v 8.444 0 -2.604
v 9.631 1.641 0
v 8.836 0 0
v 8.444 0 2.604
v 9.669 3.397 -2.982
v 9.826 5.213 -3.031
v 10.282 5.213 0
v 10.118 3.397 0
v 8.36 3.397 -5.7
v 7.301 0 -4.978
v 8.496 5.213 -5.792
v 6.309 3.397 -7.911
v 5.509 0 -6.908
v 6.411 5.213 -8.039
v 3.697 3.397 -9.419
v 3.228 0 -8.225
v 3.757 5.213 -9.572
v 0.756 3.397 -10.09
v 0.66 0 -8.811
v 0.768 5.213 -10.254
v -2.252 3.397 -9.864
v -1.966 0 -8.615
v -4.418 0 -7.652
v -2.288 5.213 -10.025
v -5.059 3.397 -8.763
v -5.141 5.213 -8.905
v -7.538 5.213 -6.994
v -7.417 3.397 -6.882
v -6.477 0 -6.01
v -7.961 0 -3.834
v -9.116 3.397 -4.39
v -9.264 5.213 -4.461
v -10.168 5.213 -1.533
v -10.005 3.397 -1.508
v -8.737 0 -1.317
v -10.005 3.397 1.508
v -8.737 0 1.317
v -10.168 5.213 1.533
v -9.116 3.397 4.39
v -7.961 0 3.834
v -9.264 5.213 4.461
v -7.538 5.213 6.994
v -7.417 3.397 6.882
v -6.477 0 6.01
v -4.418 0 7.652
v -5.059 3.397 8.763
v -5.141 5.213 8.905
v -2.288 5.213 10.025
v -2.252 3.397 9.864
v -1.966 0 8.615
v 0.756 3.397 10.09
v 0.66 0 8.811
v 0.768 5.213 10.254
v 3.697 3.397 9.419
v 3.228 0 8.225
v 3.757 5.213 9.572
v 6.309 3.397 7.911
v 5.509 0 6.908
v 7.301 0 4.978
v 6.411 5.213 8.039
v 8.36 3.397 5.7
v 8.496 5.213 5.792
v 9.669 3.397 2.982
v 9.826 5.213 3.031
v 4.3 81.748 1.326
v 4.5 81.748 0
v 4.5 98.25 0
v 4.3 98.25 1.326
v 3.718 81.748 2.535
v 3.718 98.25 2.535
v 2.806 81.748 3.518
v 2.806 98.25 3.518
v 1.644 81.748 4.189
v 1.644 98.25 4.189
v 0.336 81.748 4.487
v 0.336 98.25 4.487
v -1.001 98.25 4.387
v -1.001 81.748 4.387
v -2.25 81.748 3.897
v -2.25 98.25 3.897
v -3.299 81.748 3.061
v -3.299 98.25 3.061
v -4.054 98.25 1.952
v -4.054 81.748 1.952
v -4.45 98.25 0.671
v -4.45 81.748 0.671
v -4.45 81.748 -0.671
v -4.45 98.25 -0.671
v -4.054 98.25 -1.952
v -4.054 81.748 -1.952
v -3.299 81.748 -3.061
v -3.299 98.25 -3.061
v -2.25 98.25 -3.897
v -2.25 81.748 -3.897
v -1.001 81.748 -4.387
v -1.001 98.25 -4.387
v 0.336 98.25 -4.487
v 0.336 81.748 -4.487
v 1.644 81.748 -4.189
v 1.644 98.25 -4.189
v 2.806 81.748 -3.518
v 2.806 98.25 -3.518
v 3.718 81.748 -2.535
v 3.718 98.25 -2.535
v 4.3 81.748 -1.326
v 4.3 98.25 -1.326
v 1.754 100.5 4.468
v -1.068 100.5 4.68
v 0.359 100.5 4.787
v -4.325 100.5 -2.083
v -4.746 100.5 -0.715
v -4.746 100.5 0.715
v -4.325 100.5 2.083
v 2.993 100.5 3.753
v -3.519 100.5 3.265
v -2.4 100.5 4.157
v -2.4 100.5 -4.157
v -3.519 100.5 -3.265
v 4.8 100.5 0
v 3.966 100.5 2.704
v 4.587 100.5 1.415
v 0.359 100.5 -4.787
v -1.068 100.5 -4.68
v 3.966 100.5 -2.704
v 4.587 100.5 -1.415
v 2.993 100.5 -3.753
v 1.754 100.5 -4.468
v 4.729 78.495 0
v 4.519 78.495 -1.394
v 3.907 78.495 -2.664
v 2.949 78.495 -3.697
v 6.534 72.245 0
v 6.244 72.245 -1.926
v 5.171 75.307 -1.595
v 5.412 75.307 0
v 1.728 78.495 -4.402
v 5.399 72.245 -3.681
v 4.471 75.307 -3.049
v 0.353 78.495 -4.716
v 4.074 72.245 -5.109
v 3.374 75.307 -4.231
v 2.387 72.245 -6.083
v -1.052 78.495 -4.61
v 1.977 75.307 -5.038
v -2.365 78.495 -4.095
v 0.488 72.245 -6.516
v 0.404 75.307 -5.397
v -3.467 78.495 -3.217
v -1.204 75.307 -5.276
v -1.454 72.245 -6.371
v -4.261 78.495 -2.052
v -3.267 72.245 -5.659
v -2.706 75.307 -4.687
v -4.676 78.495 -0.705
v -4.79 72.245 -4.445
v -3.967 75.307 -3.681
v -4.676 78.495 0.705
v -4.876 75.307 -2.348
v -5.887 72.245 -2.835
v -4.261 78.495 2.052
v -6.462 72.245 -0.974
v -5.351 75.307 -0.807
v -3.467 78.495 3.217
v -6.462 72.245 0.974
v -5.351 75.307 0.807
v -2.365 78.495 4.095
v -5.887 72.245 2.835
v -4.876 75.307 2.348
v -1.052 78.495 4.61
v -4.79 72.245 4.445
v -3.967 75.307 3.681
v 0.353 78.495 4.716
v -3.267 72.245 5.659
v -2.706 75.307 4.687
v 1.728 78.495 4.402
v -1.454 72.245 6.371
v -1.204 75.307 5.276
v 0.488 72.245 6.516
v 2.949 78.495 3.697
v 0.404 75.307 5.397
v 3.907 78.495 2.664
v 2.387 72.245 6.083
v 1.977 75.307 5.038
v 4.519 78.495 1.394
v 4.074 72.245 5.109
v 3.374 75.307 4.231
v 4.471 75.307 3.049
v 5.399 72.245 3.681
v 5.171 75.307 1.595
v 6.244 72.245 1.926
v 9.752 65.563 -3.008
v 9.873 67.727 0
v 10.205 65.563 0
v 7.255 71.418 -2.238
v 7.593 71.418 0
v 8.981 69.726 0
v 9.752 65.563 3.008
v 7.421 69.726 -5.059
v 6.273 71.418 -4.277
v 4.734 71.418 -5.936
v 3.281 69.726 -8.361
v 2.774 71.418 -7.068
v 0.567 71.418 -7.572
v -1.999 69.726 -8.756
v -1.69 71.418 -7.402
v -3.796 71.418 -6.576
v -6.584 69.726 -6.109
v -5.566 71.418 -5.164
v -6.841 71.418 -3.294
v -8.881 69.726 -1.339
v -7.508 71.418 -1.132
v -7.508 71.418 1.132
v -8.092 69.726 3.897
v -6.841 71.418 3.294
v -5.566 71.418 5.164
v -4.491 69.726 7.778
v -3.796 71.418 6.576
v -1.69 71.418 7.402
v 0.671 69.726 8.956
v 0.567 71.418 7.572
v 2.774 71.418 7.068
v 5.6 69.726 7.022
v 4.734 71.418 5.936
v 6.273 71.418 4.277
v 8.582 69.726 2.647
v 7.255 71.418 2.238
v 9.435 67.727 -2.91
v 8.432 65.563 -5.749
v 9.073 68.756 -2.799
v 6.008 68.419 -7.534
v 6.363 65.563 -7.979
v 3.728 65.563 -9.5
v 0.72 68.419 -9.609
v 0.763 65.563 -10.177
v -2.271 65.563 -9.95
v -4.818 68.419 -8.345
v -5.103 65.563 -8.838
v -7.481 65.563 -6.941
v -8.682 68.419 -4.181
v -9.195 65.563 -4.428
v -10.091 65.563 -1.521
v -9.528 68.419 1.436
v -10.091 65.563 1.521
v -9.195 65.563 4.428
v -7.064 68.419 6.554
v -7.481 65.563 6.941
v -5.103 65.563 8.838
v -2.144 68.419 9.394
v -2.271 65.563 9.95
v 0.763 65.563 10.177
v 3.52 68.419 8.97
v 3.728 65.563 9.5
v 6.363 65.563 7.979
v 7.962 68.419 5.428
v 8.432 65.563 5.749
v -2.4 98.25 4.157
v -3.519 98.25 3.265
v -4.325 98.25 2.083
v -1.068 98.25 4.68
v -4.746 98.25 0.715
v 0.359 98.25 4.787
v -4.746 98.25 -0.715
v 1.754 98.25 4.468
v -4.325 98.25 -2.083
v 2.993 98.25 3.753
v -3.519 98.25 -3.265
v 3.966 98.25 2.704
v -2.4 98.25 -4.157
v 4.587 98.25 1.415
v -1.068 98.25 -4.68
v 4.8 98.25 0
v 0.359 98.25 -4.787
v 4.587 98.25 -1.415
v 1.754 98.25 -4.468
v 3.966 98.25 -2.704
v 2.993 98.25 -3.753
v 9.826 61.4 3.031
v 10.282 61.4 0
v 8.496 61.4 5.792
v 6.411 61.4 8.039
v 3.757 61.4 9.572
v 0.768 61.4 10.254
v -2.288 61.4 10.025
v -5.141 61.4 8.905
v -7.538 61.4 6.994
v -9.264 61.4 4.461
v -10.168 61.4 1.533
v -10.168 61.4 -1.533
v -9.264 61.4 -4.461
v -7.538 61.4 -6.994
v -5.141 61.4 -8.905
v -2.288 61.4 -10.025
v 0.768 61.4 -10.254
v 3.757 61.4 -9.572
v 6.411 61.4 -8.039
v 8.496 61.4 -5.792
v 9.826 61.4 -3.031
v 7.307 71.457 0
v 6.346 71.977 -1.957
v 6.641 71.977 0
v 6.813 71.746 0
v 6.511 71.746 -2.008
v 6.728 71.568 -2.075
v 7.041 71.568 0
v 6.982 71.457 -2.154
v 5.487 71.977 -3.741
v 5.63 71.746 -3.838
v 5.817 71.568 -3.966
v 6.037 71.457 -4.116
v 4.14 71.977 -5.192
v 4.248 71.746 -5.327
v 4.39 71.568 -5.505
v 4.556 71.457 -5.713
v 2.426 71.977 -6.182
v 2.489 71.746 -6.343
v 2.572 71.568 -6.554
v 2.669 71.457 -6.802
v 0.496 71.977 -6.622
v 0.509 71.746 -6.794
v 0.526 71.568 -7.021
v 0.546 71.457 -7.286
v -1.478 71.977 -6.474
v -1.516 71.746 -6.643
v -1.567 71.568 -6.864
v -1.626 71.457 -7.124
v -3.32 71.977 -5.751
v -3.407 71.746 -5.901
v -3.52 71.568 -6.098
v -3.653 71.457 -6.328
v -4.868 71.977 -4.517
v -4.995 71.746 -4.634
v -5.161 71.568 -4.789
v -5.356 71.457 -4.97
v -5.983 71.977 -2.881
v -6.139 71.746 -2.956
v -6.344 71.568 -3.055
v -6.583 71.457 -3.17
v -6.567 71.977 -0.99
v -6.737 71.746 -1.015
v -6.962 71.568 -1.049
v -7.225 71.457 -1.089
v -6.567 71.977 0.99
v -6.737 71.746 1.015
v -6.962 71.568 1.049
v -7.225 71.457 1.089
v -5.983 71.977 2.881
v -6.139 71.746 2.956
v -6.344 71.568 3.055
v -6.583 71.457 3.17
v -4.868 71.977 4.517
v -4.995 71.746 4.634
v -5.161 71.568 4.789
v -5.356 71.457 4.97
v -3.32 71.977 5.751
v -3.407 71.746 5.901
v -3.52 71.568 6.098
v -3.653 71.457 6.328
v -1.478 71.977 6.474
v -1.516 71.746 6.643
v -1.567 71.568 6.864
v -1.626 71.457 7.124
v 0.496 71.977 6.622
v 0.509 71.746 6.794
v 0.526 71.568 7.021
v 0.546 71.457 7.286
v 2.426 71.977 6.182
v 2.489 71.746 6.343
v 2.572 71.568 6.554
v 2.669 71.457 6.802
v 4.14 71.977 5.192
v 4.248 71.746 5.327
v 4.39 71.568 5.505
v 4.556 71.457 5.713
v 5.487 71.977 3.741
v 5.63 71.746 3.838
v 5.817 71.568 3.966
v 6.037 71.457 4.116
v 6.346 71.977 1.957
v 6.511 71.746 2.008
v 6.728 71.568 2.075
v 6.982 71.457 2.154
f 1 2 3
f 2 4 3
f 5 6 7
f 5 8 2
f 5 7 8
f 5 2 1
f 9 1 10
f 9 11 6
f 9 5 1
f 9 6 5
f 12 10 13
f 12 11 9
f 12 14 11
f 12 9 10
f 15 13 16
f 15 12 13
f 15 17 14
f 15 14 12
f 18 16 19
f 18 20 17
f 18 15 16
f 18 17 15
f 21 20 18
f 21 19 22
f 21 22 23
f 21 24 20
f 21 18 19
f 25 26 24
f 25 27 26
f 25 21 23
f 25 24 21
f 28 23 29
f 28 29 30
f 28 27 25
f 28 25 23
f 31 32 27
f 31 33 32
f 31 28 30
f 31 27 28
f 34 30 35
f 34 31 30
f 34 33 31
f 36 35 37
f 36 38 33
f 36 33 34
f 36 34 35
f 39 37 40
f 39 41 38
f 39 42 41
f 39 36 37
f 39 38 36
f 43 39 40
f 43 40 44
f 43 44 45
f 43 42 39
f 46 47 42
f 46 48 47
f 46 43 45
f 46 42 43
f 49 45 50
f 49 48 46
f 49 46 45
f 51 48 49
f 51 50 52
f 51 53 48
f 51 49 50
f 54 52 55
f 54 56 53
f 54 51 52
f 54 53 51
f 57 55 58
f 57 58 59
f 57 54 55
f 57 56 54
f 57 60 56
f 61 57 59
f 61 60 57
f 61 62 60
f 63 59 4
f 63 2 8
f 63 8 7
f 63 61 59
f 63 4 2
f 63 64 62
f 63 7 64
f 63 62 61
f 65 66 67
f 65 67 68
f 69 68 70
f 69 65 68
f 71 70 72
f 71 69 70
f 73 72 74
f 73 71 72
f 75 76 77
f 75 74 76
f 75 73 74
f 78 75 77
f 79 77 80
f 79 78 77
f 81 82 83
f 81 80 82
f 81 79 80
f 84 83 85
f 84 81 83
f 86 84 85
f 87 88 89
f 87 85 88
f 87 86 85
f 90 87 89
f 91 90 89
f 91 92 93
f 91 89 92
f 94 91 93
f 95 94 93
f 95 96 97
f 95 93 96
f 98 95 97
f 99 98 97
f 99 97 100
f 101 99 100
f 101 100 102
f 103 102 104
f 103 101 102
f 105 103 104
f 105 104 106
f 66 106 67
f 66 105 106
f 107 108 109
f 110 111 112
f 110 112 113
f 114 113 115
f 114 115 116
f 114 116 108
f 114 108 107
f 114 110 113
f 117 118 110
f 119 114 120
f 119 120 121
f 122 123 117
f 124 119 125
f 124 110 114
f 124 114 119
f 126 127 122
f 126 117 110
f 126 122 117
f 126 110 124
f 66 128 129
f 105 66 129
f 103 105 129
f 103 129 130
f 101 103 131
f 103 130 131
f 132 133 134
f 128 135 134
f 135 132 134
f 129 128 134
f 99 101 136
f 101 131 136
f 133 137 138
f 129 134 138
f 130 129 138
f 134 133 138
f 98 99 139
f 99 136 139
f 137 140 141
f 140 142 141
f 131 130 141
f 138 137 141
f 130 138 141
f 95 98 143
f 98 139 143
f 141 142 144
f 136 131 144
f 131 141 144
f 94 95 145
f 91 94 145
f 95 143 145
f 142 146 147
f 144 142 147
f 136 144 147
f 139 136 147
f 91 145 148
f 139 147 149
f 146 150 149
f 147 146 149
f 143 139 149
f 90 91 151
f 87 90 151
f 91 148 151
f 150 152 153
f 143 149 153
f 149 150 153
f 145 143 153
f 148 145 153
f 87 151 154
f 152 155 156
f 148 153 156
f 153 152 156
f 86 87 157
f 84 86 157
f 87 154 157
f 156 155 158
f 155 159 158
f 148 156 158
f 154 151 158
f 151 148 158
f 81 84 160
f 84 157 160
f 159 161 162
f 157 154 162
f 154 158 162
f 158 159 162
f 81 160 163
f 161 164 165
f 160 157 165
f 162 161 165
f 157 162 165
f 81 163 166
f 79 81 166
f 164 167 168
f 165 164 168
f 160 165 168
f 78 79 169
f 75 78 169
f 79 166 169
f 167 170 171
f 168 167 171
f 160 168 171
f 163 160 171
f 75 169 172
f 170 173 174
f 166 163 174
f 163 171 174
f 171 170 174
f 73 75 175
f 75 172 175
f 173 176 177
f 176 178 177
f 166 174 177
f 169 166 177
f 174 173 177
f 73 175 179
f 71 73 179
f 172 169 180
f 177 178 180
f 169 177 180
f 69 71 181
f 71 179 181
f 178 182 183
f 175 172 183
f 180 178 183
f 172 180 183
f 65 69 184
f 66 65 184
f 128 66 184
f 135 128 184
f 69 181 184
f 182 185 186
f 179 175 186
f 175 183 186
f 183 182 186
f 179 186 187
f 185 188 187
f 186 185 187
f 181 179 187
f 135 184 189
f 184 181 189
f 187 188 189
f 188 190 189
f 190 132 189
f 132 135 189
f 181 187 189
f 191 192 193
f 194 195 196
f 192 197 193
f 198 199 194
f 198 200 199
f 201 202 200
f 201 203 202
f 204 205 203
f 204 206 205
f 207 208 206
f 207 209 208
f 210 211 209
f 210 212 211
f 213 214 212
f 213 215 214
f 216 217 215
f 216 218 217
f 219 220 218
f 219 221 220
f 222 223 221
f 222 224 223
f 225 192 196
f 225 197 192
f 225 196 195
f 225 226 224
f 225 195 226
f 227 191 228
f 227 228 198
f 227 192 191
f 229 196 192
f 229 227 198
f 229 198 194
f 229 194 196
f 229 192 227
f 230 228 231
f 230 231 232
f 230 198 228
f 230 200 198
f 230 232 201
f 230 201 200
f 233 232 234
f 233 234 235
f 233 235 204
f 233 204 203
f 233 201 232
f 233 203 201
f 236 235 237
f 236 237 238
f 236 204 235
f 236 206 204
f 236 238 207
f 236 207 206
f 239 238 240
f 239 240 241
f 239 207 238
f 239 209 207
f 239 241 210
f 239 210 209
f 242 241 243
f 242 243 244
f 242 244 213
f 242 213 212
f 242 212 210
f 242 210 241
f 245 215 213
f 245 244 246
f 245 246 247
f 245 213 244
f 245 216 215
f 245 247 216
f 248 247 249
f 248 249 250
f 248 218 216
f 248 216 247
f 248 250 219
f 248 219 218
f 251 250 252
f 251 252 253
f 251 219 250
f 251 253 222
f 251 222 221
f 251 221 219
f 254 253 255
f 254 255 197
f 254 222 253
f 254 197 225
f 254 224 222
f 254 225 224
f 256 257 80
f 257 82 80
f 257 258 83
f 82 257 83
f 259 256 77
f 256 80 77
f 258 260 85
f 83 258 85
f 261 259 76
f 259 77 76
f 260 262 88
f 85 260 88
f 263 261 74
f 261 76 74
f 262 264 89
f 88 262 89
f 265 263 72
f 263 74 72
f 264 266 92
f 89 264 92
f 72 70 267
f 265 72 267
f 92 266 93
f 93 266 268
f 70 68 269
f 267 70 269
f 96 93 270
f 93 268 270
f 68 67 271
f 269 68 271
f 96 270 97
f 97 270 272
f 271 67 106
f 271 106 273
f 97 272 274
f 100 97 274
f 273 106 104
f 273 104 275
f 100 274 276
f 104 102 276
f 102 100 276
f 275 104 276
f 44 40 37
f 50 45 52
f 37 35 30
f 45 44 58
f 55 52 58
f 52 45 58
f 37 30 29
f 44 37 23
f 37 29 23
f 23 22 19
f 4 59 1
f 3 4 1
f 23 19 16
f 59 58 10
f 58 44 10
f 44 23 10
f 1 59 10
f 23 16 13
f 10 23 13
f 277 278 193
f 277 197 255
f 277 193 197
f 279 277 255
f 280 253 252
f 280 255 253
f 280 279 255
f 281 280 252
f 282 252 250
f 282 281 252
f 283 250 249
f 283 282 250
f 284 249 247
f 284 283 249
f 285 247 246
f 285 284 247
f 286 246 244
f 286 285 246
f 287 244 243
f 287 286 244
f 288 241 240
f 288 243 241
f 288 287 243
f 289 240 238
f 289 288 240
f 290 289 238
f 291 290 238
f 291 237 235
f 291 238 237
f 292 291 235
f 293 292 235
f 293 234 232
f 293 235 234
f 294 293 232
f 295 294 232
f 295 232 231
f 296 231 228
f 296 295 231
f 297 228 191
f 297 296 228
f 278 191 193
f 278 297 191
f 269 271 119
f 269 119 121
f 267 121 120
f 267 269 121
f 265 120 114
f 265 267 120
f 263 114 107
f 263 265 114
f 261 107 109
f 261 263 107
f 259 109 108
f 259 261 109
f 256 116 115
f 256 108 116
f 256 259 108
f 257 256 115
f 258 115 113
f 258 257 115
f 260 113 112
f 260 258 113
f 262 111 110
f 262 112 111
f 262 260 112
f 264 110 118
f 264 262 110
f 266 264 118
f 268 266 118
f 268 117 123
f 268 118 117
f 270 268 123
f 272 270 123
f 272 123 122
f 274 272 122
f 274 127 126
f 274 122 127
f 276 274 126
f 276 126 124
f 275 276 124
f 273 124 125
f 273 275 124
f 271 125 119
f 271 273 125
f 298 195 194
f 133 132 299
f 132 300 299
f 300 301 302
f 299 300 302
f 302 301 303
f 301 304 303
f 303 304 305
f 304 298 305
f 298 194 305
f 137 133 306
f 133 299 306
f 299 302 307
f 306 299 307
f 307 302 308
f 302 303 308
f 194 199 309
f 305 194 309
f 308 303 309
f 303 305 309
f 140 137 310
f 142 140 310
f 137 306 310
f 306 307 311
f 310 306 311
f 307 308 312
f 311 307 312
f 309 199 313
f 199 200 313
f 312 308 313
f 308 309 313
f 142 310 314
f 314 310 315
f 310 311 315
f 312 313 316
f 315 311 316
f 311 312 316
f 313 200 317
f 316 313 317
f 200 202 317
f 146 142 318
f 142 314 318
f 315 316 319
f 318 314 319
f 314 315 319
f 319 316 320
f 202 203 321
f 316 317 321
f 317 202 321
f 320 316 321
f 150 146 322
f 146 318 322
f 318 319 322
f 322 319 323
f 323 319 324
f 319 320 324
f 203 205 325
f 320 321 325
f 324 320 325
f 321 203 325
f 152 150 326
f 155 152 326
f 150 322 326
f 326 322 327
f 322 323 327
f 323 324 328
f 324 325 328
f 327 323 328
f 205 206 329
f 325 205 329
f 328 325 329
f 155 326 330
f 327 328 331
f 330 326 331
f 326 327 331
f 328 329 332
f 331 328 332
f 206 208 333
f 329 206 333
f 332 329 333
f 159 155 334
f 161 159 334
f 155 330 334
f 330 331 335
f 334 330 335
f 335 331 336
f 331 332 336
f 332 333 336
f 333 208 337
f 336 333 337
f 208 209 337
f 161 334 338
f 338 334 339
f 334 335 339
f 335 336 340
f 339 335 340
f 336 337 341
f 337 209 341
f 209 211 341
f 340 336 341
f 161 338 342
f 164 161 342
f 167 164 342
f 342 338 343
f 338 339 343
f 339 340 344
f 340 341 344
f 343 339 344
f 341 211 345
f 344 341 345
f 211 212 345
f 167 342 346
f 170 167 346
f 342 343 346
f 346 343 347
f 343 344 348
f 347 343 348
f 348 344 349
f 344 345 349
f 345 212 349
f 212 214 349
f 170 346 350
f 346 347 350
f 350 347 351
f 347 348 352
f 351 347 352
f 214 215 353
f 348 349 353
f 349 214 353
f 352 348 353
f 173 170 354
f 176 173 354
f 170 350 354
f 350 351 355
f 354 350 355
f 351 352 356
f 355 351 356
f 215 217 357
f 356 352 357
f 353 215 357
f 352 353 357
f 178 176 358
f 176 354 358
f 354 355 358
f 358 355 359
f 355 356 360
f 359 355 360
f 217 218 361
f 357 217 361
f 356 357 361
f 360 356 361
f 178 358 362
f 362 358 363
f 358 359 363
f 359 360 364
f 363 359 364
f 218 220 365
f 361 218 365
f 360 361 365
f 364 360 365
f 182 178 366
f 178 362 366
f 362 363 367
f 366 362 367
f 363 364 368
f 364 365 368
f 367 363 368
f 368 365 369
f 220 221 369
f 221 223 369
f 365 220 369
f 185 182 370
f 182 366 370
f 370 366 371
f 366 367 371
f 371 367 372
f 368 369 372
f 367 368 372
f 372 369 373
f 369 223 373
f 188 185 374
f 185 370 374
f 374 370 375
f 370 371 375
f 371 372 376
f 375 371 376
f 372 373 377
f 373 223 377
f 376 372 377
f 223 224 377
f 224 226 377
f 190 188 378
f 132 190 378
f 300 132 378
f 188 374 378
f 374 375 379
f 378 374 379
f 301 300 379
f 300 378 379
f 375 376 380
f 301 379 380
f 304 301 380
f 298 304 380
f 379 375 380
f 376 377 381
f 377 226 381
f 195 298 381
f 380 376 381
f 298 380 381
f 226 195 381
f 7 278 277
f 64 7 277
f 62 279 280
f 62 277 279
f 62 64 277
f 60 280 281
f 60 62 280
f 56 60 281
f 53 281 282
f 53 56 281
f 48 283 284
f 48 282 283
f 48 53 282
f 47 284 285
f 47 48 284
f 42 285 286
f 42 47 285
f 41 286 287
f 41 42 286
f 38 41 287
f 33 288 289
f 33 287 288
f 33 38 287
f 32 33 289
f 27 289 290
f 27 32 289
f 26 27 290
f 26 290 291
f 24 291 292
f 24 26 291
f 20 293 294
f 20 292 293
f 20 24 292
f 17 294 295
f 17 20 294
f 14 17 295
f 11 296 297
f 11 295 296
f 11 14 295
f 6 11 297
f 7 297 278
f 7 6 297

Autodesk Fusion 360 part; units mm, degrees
sketch "Sketch1" plane through (0, 0, 0) normal (0, 0, 1) x (1, 0, 0)
  line L0 (0, 0) -> (0, 100.5)
  line L1 (0, 100.5) -> (4.8, 100.5)
  line L2 (4.8, 100.5) -> (4.8, 98.25)
  line L3 (4.8, 98.25) -> (4.5, 98.25)
  line L4 (4.5, 98.25) -> (4.5, 81.7479)
  line L5 (10.2824, 61.4) -> (10.2824, 5.2127)
  line L6 (0, 0) -> (8.8361, 0)
  arc A0 (8.8361, 0) -> (10.2824, 5.2127) centre (0.1654, 5.2127) ccw
  arc A1 (4.5, 81.7479) -> (6.5345, 72.2453) centre (27.709, 81.7479) ccw
  line L7 (10.2054, 65.5631) -> (10.2824, 61.4)
  arc A2 (6.5345, 72.2453) -> (7.5928, 71.4184) centre (7.5928, 72.509) ccw
  arc A3 (10.2054, 65.5631) -> (7.5928, 71.4184) centre (1.998, 65.4114) ccw
  line L8 (8.5816, 71.4184) -> (8.683, 71.4184)
  dimension "d1" = 100.5
  dimension "d2" = 4.8
  dimension "d3" = 2.25
  dimension "d4" = 0.3
  dimension "d5" = 16.5021
  dimension "d13" = 61.4
revolve "Revolve1" add sketch "Sketch1" angle 360 about axis through (0, 0, 0) along (0, 1, 0)
equation "d1 = haed_flosku"
equation "d5 = d1 * 0.1642"
equation "d13 = d1 - 39.1 mm"
equation "haed_flosku = 100.5 mm"
